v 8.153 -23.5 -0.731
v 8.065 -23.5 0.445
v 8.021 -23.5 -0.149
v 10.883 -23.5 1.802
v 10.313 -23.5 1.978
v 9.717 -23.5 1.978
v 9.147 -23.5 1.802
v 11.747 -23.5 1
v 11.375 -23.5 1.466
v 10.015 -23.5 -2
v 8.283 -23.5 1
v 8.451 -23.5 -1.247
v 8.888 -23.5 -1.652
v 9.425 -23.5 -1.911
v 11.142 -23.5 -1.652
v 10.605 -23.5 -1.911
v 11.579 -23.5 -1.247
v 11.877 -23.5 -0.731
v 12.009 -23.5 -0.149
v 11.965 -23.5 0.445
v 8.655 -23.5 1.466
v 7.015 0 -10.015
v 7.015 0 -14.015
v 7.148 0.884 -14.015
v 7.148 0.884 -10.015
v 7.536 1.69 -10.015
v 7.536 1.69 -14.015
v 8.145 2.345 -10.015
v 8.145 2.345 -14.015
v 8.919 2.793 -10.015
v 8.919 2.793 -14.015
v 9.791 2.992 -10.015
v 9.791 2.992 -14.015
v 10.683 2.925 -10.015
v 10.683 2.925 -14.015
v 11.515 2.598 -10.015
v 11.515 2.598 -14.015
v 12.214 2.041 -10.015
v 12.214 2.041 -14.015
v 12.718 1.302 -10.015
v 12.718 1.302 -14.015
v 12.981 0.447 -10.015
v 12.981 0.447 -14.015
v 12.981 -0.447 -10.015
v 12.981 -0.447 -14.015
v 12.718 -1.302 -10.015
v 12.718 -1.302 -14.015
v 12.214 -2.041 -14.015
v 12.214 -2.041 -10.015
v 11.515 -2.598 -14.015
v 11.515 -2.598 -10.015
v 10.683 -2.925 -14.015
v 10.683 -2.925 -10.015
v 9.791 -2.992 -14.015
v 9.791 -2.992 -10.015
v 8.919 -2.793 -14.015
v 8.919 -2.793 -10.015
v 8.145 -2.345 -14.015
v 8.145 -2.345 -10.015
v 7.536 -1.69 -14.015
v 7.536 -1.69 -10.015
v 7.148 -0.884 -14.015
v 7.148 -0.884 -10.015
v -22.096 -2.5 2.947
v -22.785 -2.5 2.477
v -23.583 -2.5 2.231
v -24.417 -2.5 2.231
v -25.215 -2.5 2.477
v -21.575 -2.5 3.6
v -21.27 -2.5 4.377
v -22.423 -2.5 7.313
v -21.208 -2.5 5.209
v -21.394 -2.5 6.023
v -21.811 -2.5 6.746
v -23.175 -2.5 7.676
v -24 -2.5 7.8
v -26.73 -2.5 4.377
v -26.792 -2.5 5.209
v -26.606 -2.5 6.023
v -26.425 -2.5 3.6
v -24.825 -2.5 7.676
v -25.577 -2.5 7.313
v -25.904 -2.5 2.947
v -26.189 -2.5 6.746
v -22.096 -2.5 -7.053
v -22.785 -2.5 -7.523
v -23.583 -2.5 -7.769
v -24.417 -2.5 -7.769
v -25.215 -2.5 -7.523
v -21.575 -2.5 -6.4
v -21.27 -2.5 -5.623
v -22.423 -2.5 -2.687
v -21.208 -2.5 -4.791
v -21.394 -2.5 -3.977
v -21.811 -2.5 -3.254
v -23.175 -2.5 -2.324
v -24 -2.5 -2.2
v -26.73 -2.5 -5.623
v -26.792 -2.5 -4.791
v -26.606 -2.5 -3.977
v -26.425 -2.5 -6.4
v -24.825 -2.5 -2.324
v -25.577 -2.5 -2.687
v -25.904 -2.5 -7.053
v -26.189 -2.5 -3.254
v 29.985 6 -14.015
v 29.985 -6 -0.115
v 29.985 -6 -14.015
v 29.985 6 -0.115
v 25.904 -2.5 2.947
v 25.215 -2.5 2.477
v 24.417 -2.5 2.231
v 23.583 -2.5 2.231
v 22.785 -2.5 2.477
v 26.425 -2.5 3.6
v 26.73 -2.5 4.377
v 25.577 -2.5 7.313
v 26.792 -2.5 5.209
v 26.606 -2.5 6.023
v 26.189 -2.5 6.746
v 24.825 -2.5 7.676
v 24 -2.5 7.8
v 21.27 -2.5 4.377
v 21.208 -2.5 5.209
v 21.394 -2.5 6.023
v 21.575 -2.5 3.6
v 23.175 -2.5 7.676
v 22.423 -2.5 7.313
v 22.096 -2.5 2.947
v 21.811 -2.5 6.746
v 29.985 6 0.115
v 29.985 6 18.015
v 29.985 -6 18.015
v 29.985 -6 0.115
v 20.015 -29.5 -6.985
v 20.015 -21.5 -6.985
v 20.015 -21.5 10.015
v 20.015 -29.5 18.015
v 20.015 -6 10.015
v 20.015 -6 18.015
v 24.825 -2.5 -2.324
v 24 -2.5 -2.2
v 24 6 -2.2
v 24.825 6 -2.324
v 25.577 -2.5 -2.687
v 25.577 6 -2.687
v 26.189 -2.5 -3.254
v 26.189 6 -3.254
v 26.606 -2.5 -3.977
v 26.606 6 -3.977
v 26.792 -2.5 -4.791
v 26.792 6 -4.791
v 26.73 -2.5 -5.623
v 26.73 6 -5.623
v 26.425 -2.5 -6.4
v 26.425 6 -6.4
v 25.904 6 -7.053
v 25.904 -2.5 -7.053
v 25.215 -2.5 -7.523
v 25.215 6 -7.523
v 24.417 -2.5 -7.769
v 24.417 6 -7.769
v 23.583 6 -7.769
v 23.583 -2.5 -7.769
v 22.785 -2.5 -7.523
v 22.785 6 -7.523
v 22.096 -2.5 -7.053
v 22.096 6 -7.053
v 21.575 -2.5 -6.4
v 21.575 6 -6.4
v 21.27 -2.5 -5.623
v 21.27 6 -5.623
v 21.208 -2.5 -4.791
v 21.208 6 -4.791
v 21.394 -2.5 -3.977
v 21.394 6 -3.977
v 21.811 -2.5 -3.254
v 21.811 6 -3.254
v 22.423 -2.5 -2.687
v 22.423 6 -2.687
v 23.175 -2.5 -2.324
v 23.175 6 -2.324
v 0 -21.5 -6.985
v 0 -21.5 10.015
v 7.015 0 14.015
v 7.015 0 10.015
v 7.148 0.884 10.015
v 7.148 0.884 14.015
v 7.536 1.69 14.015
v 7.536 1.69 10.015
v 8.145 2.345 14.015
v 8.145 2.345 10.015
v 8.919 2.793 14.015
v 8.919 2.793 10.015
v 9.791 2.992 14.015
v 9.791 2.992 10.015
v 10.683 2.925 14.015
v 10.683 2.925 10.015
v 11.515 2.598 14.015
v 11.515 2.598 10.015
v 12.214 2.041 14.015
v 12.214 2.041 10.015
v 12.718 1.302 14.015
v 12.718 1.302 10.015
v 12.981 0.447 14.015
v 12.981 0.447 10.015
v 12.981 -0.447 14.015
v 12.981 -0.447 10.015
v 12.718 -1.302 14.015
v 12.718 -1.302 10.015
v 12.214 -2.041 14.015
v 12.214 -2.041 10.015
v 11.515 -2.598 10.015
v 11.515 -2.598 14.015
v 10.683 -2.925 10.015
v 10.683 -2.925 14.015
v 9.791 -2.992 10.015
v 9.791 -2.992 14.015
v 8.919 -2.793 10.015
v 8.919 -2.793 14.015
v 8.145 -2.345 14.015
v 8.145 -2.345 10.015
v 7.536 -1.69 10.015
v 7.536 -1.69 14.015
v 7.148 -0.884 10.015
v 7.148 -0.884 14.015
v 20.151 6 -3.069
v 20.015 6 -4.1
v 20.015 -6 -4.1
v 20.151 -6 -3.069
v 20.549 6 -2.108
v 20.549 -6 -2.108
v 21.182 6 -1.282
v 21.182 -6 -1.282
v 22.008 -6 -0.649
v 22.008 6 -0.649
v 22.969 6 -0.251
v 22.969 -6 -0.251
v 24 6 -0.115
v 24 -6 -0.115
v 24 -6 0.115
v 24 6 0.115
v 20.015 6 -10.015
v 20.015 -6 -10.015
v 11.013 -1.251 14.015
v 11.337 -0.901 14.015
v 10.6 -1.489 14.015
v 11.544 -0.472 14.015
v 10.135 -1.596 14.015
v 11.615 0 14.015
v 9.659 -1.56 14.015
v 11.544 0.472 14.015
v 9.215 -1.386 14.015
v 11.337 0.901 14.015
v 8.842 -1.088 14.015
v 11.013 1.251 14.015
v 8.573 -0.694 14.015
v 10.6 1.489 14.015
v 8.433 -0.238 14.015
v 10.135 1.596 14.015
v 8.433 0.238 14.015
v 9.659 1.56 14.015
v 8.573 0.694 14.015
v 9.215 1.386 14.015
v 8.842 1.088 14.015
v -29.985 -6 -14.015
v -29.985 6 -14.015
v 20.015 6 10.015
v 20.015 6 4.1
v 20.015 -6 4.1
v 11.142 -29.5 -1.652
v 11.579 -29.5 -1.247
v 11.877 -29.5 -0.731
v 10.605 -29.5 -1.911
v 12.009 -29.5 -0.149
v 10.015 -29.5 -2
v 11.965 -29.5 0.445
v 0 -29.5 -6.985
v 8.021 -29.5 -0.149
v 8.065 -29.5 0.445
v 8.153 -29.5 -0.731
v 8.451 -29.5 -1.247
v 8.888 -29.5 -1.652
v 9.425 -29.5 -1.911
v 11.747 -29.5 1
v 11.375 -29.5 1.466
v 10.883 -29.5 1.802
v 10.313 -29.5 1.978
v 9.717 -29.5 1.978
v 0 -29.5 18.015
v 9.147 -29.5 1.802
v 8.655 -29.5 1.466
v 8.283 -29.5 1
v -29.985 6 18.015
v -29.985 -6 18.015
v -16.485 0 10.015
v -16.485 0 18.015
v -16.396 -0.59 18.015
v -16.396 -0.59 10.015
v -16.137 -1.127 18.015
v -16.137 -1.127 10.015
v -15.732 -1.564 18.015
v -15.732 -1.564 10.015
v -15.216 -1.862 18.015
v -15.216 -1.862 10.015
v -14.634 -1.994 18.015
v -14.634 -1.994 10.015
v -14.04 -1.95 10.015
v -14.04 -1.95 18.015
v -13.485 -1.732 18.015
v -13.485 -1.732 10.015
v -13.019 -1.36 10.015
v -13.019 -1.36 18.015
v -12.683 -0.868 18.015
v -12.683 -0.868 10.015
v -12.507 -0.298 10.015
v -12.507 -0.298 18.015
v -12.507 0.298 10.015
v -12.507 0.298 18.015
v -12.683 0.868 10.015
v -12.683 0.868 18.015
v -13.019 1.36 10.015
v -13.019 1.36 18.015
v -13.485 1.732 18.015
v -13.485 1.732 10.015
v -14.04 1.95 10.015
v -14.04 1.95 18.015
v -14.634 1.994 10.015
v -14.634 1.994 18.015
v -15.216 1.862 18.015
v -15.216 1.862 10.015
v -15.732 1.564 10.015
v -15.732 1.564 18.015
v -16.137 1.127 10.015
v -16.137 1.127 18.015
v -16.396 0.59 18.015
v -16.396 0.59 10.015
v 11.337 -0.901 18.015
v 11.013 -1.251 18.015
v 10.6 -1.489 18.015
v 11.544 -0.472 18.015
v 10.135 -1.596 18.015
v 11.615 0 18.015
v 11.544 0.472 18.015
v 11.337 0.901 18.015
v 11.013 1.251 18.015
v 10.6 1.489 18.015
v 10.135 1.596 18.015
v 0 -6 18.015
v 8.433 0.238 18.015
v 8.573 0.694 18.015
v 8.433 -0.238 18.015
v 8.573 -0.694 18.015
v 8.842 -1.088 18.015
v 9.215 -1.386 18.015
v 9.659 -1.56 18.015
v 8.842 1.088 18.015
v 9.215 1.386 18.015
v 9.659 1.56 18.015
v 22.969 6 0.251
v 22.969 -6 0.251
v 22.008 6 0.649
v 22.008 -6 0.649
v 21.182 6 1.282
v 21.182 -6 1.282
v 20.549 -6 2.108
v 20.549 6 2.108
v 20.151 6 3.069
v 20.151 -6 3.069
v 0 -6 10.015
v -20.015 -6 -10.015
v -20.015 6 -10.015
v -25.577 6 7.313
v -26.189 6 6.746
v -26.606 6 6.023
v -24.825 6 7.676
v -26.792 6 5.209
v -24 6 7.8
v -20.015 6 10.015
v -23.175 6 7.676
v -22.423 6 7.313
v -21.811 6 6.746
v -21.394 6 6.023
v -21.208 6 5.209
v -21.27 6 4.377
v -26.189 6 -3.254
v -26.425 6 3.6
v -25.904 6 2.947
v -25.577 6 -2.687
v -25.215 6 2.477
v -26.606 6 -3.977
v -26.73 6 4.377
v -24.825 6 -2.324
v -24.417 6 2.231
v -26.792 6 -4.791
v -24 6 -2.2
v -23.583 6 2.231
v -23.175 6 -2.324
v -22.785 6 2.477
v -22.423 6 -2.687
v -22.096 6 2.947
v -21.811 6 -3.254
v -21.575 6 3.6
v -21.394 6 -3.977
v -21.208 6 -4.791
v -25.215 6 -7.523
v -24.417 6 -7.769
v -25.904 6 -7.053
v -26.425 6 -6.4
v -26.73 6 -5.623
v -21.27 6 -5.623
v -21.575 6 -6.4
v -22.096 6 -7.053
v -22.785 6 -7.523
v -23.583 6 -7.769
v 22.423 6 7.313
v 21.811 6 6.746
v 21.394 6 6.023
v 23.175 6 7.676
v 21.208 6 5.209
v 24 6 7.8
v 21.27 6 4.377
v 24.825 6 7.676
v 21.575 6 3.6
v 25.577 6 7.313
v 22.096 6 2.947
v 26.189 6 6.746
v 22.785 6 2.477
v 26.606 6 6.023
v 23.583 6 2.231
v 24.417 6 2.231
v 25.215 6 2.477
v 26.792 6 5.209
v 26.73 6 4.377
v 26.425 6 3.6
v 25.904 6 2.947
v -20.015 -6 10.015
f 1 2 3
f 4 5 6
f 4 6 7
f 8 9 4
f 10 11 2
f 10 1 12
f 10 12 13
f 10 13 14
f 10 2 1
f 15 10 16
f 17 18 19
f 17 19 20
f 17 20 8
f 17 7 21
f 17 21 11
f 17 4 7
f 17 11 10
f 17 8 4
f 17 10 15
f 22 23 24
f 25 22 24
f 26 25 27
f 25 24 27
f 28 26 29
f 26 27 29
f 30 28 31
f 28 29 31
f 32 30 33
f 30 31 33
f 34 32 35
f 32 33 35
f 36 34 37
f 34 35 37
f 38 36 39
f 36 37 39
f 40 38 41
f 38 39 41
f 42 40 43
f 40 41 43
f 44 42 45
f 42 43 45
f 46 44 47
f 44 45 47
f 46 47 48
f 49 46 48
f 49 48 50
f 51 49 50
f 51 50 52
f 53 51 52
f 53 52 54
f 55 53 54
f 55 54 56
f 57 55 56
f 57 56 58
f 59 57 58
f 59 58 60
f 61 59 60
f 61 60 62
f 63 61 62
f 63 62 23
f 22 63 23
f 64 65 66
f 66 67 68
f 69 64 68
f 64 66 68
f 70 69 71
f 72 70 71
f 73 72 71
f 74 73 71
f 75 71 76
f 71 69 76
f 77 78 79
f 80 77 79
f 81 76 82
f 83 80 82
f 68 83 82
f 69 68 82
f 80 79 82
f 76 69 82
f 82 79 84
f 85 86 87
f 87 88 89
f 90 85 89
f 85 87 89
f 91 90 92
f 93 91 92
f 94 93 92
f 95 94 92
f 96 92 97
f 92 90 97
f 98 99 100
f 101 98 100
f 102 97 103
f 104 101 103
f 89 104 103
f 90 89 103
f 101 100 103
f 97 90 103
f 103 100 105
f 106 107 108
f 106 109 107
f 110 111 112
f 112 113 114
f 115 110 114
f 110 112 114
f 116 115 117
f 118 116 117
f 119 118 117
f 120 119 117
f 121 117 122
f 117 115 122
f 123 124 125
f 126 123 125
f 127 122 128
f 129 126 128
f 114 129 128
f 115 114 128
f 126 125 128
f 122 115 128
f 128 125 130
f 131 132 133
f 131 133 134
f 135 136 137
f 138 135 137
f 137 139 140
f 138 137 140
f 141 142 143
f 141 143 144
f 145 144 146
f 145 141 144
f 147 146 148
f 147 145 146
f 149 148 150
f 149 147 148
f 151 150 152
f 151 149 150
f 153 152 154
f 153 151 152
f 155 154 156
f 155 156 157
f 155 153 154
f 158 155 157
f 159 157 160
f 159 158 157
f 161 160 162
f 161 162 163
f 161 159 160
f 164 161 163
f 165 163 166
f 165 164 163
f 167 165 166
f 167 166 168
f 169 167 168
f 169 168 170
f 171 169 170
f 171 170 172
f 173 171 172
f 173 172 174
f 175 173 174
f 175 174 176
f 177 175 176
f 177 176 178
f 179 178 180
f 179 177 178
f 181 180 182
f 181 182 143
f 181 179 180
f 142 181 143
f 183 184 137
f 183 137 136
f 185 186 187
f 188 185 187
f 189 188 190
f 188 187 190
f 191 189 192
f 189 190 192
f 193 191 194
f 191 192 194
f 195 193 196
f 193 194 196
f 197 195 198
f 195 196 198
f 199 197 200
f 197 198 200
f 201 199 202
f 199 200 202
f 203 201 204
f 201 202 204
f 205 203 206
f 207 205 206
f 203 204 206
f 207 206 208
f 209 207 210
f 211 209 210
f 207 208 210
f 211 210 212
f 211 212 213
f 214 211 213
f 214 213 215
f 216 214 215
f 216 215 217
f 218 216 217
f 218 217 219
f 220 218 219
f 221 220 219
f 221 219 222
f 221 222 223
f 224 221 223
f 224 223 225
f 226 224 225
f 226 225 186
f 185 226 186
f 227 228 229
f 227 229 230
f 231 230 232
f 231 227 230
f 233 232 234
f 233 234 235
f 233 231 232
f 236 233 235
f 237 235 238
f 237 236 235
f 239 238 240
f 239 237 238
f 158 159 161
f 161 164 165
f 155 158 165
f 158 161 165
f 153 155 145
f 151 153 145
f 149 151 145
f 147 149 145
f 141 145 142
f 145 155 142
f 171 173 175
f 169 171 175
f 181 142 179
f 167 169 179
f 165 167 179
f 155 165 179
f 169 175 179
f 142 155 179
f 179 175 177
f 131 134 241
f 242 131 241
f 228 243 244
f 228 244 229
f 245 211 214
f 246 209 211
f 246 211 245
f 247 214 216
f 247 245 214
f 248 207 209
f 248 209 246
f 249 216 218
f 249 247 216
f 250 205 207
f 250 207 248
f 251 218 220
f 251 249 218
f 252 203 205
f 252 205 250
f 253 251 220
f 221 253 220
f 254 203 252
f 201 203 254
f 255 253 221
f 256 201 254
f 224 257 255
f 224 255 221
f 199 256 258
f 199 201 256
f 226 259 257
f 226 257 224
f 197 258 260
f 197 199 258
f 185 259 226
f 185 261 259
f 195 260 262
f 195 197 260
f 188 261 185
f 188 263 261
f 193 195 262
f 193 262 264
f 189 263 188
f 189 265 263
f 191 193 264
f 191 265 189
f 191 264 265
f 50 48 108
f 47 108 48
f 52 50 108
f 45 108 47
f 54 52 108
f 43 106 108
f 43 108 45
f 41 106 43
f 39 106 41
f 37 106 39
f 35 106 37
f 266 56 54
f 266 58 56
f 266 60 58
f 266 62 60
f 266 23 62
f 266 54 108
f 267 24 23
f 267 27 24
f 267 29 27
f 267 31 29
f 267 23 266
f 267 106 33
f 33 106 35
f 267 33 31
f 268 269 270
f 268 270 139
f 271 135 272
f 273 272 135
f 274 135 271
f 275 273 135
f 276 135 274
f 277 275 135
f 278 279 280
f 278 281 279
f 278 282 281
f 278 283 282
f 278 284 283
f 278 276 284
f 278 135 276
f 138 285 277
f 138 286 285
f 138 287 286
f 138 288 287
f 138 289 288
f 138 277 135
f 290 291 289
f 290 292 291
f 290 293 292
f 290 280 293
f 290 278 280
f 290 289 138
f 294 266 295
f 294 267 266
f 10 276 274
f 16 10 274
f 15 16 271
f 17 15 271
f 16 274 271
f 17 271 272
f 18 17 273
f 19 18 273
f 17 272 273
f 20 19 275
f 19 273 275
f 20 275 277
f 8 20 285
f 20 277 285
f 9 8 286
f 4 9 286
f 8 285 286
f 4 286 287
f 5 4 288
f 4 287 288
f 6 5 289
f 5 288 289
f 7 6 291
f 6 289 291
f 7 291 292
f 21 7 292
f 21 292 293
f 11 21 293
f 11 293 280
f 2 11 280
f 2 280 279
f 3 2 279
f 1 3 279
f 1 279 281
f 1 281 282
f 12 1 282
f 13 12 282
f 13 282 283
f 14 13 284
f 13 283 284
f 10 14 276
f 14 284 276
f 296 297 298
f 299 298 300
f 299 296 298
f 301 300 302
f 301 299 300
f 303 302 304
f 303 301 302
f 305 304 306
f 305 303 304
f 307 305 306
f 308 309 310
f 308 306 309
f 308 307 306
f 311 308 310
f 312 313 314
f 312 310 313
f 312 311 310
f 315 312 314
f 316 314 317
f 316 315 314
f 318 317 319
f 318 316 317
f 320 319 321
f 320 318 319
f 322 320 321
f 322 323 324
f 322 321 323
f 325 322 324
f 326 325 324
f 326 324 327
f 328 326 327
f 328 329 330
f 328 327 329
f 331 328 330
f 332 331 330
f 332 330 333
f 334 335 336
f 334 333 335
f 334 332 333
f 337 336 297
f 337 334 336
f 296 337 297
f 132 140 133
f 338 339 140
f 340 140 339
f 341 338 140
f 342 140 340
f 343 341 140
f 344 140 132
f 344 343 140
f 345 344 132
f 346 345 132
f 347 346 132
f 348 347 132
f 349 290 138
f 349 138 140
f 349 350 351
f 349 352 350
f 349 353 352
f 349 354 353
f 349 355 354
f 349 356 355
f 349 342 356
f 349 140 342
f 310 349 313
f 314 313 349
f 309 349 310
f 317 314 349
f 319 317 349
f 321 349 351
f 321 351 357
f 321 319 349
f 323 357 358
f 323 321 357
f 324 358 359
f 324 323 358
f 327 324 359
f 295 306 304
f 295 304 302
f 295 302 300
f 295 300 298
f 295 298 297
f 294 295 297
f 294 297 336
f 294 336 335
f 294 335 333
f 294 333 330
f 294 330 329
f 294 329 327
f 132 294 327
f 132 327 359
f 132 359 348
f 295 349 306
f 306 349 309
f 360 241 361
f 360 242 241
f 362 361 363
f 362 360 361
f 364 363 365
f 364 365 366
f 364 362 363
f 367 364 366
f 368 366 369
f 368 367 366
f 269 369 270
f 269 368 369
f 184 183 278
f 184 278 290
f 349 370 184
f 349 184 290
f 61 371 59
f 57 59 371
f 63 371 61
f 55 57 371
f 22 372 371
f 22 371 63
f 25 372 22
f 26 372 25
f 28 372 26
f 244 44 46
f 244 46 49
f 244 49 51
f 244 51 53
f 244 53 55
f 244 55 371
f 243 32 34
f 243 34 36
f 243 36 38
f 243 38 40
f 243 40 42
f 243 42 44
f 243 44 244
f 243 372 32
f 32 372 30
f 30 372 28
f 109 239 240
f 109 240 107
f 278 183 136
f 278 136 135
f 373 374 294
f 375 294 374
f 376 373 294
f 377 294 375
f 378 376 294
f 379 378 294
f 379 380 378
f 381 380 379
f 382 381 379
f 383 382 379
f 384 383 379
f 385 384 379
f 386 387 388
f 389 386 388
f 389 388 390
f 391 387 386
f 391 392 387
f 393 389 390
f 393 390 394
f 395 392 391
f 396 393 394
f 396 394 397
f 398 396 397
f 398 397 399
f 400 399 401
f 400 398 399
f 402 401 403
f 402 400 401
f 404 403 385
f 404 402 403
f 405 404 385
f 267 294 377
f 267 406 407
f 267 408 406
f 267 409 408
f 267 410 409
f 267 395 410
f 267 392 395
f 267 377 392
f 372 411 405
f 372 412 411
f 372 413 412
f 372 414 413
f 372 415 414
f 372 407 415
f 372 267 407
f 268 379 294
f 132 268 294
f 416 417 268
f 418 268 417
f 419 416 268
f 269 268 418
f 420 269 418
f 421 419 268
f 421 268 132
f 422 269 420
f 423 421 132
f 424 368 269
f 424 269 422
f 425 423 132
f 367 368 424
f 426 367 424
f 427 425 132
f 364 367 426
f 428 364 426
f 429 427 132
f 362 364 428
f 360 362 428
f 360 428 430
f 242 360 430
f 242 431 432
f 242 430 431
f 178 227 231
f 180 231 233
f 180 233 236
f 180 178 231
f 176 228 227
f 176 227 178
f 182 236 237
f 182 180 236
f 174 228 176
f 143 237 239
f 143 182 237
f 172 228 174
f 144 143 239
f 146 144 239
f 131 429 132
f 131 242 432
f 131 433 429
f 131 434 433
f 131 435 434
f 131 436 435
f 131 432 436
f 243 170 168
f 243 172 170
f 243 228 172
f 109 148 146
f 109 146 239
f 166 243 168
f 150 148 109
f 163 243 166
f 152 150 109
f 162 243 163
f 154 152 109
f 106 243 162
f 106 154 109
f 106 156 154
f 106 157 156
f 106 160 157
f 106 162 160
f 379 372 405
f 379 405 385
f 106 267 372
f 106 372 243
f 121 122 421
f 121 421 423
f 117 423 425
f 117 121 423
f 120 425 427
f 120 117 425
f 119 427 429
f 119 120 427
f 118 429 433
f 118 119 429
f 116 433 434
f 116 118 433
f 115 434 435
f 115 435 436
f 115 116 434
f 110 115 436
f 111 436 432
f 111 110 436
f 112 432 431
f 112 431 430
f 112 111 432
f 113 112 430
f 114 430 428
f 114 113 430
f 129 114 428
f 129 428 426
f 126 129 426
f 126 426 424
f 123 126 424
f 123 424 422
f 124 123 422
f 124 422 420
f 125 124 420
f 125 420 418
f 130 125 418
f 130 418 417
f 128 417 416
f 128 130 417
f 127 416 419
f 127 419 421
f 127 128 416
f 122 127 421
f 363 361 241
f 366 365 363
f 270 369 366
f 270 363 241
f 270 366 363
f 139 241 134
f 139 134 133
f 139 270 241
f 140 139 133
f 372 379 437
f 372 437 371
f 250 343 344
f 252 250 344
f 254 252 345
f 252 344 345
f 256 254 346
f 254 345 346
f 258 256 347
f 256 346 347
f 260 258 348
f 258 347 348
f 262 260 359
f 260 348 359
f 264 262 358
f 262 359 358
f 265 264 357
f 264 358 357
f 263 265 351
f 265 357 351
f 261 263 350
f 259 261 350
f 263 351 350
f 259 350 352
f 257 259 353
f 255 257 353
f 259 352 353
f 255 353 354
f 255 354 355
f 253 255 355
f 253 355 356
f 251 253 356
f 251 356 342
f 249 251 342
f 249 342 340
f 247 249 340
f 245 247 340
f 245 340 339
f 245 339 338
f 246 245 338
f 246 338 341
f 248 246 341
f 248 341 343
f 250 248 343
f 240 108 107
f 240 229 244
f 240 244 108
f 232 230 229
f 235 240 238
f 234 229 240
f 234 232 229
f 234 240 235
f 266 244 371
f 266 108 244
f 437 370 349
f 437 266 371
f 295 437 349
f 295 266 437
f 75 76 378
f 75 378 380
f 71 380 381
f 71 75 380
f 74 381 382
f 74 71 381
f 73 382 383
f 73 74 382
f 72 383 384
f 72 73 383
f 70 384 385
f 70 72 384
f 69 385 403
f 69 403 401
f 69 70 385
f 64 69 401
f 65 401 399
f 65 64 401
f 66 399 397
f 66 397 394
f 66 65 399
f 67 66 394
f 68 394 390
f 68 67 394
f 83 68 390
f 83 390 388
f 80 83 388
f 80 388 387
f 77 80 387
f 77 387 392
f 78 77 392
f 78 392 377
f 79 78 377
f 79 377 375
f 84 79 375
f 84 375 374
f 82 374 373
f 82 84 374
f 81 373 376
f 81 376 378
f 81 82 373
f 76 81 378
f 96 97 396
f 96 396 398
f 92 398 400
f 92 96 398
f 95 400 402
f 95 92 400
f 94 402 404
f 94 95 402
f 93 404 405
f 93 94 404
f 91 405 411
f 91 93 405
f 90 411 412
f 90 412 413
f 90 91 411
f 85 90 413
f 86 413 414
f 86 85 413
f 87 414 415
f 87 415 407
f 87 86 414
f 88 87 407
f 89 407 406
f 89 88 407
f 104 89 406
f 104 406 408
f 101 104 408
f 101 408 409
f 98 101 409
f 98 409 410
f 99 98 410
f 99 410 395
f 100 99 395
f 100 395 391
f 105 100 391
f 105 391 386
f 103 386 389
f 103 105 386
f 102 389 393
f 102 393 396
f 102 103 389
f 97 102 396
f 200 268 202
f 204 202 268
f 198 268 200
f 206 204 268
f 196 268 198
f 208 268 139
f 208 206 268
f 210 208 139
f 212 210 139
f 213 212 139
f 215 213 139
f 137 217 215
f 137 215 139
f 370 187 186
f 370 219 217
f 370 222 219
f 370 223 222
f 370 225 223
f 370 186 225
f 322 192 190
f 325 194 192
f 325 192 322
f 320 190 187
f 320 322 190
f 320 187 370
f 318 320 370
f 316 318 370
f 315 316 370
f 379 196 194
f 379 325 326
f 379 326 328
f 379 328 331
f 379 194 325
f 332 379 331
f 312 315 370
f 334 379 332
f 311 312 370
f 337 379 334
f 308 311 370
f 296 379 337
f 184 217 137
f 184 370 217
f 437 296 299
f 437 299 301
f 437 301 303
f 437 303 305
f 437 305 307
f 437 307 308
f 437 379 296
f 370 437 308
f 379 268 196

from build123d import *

# Parameters (mm, degrees)
SKETCH1_R               = 2.8
SKETCH1_W               = 55.97
SKETCH1_H               = 4
SKETCH1_W_2             = 2
BOSS_EXTRUDE1_DEPTH     = 6
SKETCH2_R               = 2.8
BOSS_EXTRUDE2_DEPTH     = 3.5
SKETCH3_R               = 1.6
CUT_EXTRUDE1_DEPTH      = 10
SKETCH4_R               = 3
CUT_EXTRUDE2_DEPTH      = 28.03
BOSS_EXTRUDE3_DEPTH     = 20.015
SKETCH6_R               = 2
CUT_EXTRUDE3_DEPTH      = 6
CUT_EXTRUDE6_DEPTH      = 53.87032367
CUT_EXTRUDE6_DEPTH_BACK = 8
SKETCH10_R              = 2


with BuildPart() as part:
    # Sketch1 → Boss-Extrude1 (new, symmetric)
    # profile 1 of 8: a face of its own
    with BuildSketch(Plane(origin=(0, 0, 0), x_dir=(1, 0, 0), z_dir=(0, 1, 0))):
        with BuildLine():
            ThreePointArc((24, -0.115), (21.182179477, -1.282179477), (20.015, -4.1))
            Line((20.015, -4.1), (20.015, -10.015))
            Line((20.015, -10.015), (-20.015, -10.015))
            Line((-20.015, -10.015), (-20.015, 10.015))
            Line((-20.015, 10.015), (20.015, 10.015))
            Line((20.015, 10.015), (20.015, 4.1))
            ThreePointArc((20.015, 4.1), (21.182179477, 1.282179477), (24, 0.115))
            ThreePointArc((24, 0.115), (26.817820523, 1.282179477), (27.985, 4.1))
            Line((27.985, 4.1), (27.985, 14.015))
            Line((27.985, 14.015), (-27.985, 14.015))
            Line((-27.985, 14.015), (-27.985, -14.015))
            Line((-27.985, -14.015), (27.985, -14.015))
            Line((27.985, -14.015), (27.985, -4.1))
            ThreePointArc((27.985, -4.1), (26.817820523, -1.282179477), (24, -0.115))
        make_face()
        with Locations(Location((-24, -5, 0), (0, 0, 270))):
            Circle(SKETCH1_R, mode=Mode.SUBTRACT)
        with Locations(Location((-24, 5, 0), (0, 0, 270))):
            Circle(SKETCH1_R, mode=Mode.SUBTRACT)
        with Locations(Location((24, -5, 0), (0, 0, 270))):
            Circle(SKETCH1_R, mode=Mode.SUBTRACT)
        with Locations(Location((24, 5, 0), (0, 0, 270))):
            Circle(SKETCH1_R, mode=Mode.SUBTRACT)
    # profile 2 of 8: a face of its own
    with BuildSketch(Plane(origin=(0, 0, 0), x_dir=(1, 0, 0), z_dir=(0, 1, 0))):
        with Locations((0, -16.015)):
            Rectangle(SKETCH1_W, SKETCH1_H)
    # profile 3 of 8: a face of its own
    with BuildSketch(Plane(origin=(0, 0, 0), x_dir=(1, 0, 0), z_dir=(0, 1, 0))):
        Polygon((27.985, 4.1), (27.985, 0.115), (29.985, 0.115), (29.985, 14.015), (27.985, 14.015), align=None)
    # profile 4 of 8: a face of its own
    with BuildSketch(Plane(origin=(0, 0, 0), x_dir=(1, 0, 0), z_dir=(0, 1, 0))):
        Polygon((29.985, -0.115), (27.985, -0.115), (27.985, -4.1), (27.985, -14.015), (29.985, -14.015), align=None)
    # profile 5 of 8: a face of its own
    with BuildSketch(Plane(origin=(0, 0, 0), x_dir=(1, 0, 0), z_dir=(0, 1, 0))):
        with BuildLine():
            Line((27.985, -4.1), (27.985, -0.115))
            Line((27.985, -0.115), (24, -0.115))
            ThreePointArc((24, -0.115), (26.817820523, -1.282179477), (27.985, -4.1))
        make_face()
    # profile 6 of 8: a face of its own
    with BuildSketch(Plane(origin=(0, 0, 0), x_dir=(1, 0, 0), z_dir=(0, 1, 0))):
        with BuildLine():
            Line((24, 0.115), (27.985, 0.115))
            Line((27.985, 0.115), (27.985, 4.1))
            ThreePointArc((27.985, 4.1), (26.817820523, 1.282179477), (24, 0.115))
        make_face()
    # profile 7 of 8: a face of its own
    with BuildSketch(Plane(origin=(0, 0, 0), x_dir=(1, 0, 0), z_dir=(0, 1, 0))):
        with Locations((28.985, -16.015)):
            Rectangle(SKETCH1_W_2, SKETCH1_H)
    # profile 8 of 8: a face of its own
    with BuildSketch(Plane(origin=(0, 0, 0), x_dir=(1, 0, 0), z_dir=(0, 1, 0))):
        Polygon((-29.985, 14.015), (-29.985, -18.015), (-27.985, -18.015), (-27.985, -14.015), (-27.985, 14.015), align=None)
    extrude(amount=BOSS_EXTRUDE1_DEPTH, both=True)

    # Sketch2 → Boss-Extrude2 (add)
    with BuildSketch(Plane.XZ.offset(6)):
        with Locations(Location((24, -5, 0), (0, 0, 90))):
            Circle(SKETCH2_R)
        with Locations(Location((24, 5, 0), (0, 0, 90))):
            Circle(SKETCH2_R)
        with Locations(Location((-24, -5, 0), (0, 0, 90))):
            Circle(SKETCH2_R)
        with Locations(Location((-24, 5, 0), (0, 0, 90))):
            Circle(SKETCH2_R)
    extrude(amount=-BOSS_EXTRUDE2_DEPTH)

    # Sketch3 → Cut-Extrude1 (cut)
    with BuildSketch(Plane.XY.offset(18.015)):
        with Locations((10.015, 0)):
            Circle(SKETCH3_R)
    extrude(amount=-CUT_EXTRUDE1_DEPTH, mode=Mode.SUBTRACT)

    # Sketch4 → Cut-Extrude2 (cut)
    with BuildSketch(Plane(origin=(0, 0, -14.015), x_dir=(-1, 0, 0), z_dir=(0, 0, -1))):
        with Locations((-10.015, 0)):
            Circle(SKETCH4_R)
    extrude(amount=-CUT_EXTRUDE2_DEPTH, mode=Mode.SUBTRACT)

    # Sketch5 → Boss-Extrude3 (add)
    with BuildSketch(Plane(origin=(0, 0, 0), x_dir=(0, 0, -1), z_dir=(1, 0, 0))):
        Polygon((-18.015, -6), (-10.015, -6), (-10.015, -21.5), (6.985, -21.5), (6.985, -29.5), (-18.015, -29.5), align=None)
    extrude(amount=BOSS_EXTRUDE3_DEPTH)

    # Sketch6 → Cut-Extrude3 (cut)
    with BuildSketch(Plane.XZ.offset(29.5)):
        with Locations(Location((10.015, 0, 0), (0, 0, 270))):
            Circle(SKETCH6_R)
    extrude(amount=-CUT_EXTRUDE3_DEPTH, mode=Mode.SUBTRACT)

    # Sketch10 → Cut-Extrude6 (cut, two sides: drawn at the far end of the back side and taken through both)
    with BuildSketch(Plane.XY.offset(18.015).offset(-CUT_EXTRUDE6_DEPTH_BACK)):
        with Locations(Location((-14.485, 0, 0), (0, 0, 180))):
            Circle(SKETCH10_R)
    extrude(amount=CUT_EXTRUDE6_DEPTH + CUT_EXTRUDE6_DEPTH_BACK, mode=Mode.SUBTRACT)


solid = part.part
